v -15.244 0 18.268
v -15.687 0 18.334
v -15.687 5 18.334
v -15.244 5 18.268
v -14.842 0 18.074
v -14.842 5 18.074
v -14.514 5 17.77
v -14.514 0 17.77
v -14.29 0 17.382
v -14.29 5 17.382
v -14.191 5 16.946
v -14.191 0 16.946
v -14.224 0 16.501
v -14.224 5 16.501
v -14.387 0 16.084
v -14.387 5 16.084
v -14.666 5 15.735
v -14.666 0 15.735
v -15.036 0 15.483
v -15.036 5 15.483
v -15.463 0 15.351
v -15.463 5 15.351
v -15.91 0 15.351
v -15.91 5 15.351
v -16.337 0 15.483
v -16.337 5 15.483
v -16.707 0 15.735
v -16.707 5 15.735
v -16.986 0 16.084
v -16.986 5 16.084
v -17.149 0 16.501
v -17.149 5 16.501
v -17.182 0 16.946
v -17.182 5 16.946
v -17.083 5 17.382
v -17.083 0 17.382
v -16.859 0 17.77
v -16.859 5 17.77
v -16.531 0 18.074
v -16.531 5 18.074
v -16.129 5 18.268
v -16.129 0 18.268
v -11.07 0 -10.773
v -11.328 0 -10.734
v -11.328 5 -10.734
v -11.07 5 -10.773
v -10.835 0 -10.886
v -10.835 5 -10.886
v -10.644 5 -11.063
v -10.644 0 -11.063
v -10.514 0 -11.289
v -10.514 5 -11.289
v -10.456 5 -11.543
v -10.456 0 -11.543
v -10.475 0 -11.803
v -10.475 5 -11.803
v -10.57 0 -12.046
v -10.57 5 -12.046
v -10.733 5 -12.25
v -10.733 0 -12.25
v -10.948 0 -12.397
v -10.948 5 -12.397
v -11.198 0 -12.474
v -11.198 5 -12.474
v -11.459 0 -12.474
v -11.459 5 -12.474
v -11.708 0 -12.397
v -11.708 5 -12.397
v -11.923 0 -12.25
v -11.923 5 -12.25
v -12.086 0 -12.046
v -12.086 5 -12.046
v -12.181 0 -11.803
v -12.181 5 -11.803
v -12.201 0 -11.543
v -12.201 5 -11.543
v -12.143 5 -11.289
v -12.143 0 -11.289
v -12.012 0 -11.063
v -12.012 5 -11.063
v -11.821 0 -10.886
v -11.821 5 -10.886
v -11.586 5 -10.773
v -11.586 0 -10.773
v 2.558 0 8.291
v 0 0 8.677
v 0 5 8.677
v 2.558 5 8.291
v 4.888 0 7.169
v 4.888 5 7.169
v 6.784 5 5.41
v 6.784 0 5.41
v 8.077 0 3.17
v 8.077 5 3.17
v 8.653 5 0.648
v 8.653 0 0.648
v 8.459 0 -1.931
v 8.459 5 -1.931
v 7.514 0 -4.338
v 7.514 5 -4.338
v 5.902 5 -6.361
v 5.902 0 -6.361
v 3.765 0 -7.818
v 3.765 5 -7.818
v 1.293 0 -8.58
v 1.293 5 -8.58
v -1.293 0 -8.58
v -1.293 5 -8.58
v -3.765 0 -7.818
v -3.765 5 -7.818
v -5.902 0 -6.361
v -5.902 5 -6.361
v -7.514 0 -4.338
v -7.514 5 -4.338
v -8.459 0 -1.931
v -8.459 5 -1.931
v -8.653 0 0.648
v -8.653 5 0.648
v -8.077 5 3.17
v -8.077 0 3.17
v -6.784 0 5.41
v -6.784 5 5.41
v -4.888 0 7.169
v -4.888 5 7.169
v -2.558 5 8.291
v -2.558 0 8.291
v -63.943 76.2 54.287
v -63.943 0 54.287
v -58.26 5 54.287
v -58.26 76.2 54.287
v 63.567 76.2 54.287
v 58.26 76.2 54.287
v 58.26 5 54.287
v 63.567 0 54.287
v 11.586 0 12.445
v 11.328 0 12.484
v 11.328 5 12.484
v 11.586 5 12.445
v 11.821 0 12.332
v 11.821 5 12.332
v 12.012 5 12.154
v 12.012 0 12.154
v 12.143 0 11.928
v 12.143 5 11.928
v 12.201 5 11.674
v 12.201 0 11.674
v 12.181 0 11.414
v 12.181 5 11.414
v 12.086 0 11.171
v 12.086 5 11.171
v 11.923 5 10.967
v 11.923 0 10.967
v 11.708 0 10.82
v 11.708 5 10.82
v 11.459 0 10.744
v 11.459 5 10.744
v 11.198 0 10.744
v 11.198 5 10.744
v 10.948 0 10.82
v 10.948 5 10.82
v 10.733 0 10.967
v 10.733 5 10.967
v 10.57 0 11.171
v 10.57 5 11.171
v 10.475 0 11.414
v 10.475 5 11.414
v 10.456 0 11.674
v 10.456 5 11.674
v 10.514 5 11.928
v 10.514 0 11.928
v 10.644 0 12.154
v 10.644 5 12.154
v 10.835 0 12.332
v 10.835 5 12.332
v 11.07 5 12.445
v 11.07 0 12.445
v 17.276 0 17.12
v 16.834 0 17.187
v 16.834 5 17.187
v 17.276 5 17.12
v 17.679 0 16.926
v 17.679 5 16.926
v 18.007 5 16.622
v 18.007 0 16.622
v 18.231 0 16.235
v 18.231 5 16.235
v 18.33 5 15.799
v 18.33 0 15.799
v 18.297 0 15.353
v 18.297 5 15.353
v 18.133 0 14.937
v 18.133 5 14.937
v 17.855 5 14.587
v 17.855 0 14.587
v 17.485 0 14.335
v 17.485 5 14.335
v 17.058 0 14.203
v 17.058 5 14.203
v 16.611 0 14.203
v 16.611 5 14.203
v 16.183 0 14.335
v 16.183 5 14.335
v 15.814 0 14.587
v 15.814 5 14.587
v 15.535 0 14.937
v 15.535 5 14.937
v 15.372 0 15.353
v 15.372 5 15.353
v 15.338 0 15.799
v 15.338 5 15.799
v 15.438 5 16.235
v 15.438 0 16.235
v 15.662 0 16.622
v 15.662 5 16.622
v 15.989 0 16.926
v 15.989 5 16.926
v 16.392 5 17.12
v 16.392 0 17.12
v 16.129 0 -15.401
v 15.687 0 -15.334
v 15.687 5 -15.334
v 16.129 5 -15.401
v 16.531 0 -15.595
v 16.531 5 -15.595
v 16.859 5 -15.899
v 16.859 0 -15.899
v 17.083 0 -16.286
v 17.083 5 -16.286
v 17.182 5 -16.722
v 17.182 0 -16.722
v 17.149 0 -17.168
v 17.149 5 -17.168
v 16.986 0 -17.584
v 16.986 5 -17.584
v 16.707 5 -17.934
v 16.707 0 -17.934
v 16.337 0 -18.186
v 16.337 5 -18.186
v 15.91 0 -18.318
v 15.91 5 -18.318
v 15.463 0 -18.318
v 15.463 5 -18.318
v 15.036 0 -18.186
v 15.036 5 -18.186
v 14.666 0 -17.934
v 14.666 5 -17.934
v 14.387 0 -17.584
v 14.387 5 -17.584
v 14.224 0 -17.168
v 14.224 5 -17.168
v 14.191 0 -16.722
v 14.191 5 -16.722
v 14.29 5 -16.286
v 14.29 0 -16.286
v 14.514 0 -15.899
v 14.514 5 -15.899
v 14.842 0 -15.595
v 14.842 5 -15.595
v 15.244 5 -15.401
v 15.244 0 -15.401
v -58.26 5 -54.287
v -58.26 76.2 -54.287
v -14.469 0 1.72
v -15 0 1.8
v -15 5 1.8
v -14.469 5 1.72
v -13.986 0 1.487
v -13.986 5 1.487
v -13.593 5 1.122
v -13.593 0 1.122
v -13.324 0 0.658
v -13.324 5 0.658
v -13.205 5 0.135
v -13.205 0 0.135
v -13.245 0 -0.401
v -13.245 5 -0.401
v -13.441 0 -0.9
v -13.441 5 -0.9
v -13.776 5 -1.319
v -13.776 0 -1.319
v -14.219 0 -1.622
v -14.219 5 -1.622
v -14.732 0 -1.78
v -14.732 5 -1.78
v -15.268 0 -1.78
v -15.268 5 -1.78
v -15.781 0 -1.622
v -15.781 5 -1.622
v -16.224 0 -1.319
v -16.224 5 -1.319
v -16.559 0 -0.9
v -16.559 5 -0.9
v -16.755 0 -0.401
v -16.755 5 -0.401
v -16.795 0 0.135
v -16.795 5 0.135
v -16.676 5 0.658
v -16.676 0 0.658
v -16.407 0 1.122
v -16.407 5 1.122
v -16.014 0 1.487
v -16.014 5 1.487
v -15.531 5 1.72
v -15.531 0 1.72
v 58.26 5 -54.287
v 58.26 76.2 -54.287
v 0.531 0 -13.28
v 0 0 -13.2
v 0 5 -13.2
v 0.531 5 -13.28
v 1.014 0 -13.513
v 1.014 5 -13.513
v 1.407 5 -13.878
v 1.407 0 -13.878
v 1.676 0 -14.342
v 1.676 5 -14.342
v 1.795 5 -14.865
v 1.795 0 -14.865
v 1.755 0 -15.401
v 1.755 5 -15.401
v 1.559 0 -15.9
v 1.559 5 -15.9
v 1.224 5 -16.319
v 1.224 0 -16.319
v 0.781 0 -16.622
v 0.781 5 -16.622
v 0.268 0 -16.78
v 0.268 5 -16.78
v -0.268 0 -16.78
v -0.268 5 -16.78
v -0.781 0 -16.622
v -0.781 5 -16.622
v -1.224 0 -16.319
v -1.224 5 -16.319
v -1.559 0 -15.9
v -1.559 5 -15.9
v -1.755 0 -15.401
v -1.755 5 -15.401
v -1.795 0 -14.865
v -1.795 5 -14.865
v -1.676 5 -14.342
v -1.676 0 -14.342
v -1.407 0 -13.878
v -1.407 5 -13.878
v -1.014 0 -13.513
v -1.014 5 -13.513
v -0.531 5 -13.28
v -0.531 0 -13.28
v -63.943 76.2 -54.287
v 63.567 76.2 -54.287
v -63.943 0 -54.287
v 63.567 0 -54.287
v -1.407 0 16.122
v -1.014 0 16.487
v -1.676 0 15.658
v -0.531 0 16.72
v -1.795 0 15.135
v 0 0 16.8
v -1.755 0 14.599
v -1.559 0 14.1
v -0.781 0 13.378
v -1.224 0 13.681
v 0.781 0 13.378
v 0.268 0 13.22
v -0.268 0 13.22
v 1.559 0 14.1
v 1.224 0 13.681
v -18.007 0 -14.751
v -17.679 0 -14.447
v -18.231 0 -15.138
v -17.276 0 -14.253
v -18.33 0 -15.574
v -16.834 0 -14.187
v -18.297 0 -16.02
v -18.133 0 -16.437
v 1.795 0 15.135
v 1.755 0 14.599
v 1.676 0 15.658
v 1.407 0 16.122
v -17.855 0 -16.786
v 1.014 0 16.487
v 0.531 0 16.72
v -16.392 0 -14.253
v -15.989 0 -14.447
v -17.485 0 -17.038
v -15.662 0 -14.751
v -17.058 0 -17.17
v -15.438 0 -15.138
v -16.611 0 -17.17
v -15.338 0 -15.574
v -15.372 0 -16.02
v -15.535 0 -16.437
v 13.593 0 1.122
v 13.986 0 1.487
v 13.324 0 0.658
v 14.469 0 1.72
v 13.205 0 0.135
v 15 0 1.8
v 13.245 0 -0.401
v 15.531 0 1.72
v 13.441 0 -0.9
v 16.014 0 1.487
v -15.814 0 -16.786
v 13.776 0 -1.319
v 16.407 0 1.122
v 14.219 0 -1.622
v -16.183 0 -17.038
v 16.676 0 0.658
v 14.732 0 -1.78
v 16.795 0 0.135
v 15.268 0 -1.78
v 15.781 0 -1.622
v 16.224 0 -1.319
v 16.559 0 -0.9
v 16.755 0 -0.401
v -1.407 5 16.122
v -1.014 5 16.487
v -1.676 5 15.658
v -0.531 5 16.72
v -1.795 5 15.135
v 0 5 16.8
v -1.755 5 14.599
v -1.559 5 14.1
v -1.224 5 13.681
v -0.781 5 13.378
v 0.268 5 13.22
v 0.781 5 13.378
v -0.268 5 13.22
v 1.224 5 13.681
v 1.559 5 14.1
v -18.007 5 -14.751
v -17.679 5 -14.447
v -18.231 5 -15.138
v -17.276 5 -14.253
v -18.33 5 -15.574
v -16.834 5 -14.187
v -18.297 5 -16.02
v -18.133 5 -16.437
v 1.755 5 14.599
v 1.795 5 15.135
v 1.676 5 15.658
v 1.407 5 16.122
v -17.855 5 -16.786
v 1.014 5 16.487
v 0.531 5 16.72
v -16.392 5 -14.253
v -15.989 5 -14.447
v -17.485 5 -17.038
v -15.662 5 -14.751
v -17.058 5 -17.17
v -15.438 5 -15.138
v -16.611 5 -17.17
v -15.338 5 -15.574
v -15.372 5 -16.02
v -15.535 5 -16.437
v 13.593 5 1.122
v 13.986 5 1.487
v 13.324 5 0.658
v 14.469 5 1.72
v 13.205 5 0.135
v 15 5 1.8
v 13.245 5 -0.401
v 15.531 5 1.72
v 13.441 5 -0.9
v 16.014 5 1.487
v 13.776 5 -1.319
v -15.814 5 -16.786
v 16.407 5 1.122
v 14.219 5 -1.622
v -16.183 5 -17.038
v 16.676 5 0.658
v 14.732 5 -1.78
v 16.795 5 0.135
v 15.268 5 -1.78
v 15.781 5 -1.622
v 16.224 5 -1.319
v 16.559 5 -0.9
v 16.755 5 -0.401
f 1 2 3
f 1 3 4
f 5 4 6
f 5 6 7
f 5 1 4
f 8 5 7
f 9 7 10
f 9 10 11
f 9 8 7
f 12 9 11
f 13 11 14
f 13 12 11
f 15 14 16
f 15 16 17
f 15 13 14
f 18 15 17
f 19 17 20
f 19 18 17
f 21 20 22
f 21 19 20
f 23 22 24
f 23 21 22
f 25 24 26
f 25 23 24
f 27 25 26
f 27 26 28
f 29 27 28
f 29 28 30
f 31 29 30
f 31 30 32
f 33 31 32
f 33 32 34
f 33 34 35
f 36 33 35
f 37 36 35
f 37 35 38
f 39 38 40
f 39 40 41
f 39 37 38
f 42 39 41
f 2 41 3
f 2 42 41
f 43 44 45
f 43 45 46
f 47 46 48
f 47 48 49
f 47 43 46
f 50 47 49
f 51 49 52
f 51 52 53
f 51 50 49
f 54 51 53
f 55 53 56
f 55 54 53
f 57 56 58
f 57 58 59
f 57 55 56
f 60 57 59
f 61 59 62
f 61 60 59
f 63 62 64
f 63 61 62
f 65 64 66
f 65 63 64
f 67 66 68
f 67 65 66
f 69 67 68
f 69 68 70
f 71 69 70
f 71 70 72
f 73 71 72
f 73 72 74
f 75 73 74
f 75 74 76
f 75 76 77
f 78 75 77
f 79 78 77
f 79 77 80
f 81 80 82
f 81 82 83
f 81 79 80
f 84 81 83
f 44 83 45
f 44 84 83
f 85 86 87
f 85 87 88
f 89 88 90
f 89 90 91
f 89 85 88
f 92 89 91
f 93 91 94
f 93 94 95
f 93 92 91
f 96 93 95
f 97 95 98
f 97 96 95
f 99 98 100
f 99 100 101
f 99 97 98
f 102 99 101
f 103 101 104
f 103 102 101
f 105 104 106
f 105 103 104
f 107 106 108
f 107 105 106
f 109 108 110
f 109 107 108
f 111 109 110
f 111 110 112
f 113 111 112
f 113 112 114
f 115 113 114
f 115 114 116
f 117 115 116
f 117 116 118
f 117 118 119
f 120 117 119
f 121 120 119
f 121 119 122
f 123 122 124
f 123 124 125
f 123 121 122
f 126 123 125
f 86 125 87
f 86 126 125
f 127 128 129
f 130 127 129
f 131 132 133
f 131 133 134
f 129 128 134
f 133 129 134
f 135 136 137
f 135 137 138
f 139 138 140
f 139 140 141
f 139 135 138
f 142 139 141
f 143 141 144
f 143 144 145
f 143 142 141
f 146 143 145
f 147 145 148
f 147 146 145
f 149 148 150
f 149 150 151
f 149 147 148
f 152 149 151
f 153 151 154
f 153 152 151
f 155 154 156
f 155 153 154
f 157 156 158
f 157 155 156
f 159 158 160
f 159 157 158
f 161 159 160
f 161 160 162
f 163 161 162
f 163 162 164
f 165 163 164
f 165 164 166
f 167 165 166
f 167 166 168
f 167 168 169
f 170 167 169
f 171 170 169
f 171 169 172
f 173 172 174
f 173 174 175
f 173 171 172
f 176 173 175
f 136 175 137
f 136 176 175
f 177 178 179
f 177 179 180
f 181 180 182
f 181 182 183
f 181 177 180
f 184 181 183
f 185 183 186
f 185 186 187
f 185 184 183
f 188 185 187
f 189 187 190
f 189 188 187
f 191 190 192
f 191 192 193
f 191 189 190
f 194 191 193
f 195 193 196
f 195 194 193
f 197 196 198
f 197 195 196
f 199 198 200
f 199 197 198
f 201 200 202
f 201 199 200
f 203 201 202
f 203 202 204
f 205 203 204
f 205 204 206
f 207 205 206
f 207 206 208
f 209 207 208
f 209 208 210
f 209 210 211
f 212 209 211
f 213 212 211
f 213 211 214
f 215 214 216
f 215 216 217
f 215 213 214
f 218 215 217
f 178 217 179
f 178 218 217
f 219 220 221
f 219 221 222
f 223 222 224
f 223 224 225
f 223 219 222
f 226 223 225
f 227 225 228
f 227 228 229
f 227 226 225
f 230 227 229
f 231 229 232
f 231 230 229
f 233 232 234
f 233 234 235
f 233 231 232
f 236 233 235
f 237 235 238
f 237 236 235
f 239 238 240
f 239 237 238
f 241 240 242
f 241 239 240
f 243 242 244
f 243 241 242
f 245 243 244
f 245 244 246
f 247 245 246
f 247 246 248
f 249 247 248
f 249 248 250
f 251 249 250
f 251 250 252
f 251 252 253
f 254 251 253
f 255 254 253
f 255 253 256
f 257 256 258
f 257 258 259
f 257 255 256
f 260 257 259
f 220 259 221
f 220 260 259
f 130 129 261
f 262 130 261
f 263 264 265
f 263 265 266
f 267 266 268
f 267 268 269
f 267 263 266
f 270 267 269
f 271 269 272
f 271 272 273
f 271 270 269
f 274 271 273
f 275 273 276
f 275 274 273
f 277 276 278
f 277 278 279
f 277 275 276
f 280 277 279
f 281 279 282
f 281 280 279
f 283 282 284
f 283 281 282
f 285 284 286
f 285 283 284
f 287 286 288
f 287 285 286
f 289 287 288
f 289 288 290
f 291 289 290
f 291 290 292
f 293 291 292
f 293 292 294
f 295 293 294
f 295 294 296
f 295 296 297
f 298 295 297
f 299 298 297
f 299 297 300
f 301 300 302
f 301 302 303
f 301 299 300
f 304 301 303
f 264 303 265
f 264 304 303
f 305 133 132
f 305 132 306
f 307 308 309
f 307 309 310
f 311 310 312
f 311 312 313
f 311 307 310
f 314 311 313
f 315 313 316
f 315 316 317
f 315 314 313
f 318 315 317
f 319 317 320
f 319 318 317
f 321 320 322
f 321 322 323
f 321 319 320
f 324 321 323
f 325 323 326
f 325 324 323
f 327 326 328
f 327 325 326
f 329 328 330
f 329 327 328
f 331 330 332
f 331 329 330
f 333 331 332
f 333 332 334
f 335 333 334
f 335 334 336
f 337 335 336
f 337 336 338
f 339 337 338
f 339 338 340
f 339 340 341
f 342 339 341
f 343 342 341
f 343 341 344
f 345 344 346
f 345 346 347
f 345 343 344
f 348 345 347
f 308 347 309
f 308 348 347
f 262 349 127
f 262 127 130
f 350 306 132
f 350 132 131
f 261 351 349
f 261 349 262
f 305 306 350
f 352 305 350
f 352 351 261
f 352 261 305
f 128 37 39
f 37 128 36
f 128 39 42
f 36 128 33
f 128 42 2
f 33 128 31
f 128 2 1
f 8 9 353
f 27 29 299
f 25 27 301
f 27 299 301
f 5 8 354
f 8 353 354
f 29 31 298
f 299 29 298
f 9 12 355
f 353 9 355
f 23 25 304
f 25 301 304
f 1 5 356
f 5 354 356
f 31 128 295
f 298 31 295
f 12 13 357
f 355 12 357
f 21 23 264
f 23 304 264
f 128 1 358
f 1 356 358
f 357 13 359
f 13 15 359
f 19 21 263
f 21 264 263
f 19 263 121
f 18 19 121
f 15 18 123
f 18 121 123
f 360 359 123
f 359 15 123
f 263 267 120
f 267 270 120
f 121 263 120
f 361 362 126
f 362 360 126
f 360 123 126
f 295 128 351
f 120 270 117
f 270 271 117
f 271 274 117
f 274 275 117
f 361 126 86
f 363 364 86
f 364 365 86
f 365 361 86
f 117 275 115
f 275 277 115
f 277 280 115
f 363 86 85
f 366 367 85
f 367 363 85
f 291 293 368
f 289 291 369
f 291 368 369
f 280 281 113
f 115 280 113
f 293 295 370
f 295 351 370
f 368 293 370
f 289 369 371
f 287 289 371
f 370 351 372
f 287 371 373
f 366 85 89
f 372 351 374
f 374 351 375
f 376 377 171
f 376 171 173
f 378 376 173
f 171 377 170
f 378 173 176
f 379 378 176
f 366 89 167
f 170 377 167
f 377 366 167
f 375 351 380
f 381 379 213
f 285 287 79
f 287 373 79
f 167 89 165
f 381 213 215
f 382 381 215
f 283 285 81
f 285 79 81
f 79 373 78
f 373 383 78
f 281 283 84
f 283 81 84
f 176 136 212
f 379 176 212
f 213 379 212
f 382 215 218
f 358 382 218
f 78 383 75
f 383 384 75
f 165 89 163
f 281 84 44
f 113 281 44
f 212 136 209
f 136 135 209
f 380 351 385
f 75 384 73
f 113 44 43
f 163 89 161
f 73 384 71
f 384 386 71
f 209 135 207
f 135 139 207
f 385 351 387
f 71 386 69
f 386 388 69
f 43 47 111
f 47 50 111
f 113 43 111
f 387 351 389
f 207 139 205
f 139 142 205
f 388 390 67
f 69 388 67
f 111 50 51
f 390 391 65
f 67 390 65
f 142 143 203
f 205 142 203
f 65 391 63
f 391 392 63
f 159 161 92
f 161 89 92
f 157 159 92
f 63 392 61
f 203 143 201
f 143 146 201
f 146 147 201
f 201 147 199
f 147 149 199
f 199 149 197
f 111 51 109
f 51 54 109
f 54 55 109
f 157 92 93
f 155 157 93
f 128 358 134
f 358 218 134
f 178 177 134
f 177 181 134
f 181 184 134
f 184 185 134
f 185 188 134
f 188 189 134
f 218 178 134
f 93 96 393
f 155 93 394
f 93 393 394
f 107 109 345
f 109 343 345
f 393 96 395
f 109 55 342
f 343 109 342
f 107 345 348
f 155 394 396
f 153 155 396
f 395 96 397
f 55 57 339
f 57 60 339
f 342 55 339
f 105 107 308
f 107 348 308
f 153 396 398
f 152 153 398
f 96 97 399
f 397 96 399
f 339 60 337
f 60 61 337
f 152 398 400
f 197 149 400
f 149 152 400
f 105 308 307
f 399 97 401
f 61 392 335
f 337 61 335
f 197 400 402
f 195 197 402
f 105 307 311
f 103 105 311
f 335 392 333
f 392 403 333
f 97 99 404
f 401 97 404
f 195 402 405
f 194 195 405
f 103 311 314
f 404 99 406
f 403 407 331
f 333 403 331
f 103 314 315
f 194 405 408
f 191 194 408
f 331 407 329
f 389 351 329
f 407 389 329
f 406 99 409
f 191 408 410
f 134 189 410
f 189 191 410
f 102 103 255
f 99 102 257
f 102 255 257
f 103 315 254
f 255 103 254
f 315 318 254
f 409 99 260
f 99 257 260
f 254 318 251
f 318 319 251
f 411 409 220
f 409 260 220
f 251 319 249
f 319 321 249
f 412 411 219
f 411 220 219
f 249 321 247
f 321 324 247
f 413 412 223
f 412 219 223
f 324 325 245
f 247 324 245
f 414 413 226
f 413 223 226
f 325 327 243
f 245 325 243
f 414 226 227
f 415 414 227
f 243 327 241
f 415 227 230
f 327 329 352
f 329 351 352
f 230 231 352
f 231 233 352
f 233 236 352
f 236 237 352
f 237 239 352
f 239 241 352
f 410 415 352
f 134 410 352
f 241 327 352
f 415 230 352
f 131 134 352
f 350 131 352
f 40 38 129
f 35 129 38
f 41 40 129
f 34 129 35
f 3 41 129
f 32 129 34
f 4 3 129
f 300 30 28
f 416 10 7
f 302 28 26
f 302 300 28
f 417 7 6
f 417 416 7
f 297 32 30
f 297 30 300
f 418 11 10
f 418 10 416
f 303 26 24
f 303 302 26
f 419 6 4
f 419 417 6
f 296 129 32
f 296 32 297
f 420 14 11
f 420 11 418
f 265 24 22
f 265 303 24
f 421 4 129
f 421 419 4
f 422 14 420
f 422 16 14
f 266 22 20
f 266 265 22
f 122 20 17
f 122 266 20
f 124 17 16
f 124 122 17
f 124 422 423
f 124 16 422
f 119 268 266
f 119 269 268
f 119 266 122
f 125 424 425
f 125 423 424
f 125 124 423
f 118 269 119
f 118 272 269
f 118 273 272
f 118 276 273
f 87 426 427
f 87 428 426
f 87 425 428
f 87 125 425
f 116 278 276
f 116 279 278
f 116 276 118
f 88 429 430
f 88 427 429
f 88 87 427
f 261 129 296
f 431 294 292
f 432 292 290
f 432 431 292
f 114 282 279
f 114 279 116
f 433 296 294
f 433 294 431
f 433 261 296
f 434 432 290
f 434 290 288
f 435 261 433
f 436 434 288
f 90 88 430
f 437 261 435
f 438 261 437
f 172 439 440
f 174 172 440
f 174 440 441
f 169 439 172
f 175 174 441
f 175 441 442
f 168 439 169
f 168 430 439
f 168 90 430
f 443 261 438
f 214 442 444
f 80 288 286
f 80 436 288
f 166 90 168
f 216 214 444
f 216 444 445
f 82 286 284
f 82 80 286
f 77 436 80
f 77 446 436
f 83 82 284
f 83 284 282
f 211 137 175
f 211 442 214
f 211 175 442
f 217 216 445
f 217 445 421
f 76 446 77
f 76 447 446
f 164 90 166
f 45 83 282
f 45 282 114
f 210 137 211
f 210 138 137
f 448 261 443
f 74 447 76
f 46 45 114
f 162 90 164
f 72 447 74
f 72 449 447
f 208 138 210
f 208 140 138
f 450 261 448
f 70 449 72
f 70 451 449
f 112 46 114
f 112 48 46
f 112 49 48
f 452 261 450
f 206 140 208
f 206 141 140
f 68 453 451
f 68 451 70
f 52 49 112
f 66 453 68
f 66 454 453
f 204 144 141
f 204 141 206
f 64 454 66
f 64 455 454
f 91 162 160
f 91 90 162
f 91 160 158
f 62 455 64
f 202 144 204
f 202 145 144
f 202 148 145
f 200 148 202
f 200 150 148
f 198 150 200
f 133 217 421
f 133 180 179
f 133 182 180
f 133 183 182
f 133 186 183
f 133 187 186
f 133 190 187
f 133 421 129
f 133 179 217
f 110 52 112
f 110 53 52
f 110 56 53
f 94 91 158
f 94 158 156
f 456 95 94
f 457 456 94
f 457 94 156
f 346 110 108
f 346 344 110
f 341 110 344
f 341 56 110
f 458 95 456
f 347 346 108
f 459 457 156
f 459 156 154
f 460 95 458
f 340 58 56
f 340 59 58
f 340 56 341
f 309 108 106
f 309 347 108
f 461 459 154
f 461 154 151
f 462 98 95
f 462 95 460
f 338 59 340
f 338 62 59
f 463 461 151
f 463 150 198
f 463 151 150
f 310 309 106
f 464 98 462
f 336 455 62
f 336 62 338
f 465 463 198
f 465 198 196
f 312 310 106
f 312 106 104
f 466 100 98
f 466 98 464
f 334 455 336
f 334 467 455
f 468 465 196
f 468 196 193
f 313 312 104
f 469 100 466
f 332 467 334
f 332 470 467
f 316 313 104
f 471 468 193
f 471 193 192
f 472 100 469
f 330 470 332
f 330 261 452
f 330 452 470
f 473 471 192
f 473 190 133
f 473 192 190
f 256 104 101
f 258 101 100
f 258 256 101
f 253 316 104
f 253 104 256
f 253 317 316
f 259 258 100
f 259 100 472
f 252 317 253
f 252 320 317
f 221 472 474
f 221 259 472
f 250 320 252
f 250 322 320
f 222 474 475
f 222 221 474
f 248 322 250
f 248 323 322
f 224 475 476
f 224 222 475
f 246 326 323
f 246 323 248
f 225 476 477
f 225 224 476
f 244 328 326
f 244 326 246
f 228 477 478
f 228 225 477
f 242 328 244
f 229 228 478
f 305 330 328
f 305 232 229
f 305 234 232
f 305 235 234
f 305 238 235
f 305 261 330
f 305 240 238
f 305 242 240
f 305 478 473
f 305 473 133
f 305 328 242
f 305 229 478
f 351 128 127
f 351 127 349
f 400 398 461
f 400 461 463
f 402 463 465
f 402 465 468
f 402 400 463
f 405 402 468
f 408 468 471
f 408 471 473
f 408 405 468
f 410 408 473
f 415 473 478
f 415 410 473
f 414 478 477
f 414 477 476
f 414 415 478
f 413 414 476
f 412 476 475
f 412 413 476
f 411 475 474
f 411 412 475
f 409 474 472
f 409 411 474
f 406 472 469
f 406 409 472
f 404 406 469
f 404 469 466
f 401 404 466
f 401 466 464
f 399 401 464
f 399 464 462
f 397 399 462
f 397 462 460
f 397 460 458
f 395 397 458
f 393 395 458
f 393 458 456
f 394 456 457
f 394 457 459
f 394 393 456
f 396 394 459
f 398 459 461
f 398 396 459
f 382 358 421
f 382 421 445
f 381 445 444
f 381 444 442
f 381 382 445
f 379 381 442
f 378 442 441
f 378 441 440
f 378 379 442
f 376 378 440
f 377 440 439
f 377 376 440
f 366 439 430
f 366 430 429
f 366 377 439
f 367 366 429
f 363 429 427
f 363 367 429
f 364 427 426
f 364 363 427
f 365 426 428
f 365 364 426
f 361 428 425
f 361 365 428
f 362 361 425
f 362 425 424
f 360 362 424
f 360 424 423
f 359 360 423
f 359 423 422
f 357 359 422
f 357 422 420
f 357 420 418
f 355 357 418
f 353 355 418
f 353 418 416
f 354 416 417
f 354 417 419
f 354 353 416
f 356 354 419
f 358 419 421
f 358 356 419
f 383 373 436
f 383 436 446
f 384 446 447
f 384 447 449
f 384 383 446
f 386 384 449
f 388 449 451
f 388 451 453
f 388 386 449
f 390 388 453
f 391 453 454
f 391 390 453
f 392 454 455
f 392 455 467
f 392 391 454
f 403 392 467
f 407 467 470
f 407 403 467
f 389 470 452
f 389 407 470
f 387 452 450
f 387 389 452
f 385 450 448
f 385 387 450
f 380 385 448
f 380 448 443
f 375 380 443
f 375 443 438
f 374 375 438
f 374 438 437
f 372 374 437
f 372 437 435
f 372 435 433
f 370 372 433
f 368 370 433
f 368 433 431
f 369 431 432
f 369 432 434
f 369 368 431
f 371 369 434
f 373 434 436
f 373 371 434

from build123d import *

# Parameters (mm, degrees)
SKETCH1_W             = 5.683554567
SKETCH1_H             = 108.574669318
BOSS_EXTRUDE2_DEPTH   = 76.2
SKETCH1_W_2           = 5.307190744
BOSS_EXTRUDE2_2_DEPTH = 76.2
SKETCH1_5_W           = 116.519157318
SKETCH1_5_H           = 108.574669318
SKETCH1_5_R           = 1.5
SKETCH1_5_R_2         = 1.8
SKETCH1_5_R_3         = 0.875
SKETCH1_5_R_4         = 8.6768437
BOSS_EXTRUDE3_DEPTH   = 5


with BuildPart() as part:
    # Sketch1 → Boss-Extrude2 (new body)
    with BuildSketch(Plane(origin=(0, 0, 0), x_dir=(1, 0, 0), z_dir=(0, 1, 0))):
        with Locations((-61.101355943, 0)):
            Rectangle(SKETCH1_W, SKETCH1_H)
    extrude(amount=BOSS_EXTRUDE2_DEPTH)



with BuildPart() as body_2:
    # Sketch1 → Boss-Extrude2 2 (new body)
    with BuildSketch(Plane(origin=(0, 0, 0), x_dir=(1, 0, 0), z_dir=(0, 1, 0))):
        with Locations((60.913174031, 0)):
            Rectangle(SKETCH1_W_2, SKETCH1_H)
    extrude(amount=BOSS_EXTRUDE2_2_DEPTH)


with BuildPart() as part_1:
    add(part.part)

    add(body_2.part)  # Boss-Extrude3 merges body 2
    # Sketch1<5> → Boss-Extrude3 (add)
    with BuildSketch(Plane(origin=(0, 0, 0), x_dir=(1, 0, 0), z_dir=(0, 1, 0))):
        Rectangle(SKETCH1_5_W, SKETCH1_5_H)
        with Locations((-15.686506038, -16.834299163)):
            Circle(SKETCH1_5_R, mode=Mode.SUBTRACT)
        with Locations((-15, 0)):
            Circle(SKETCH1_5_R_2, mode=Mode.SUBTRACT)
        with Locations((0, -15)):
            Circle(SKETCH1_5_R_2, mode=Mode.SUBTRACT)
        with Locations((16.834299163, -15.686506038)):
            Circle(SKETCH1_5_R, mode=Mode.SUBTRACT)
        with Locations((11.328100331, -11.608727014)):
            Circle(SKETCH1_5_R_3, mode=Mode.SUBTRACT)
        Circle(SKETCH1_5_R_4, mode=Mode.SUBTRACT)
        with Locations((-11.328100331, 11.608727014)):
            Circle(SKETCH1_5_R_3, mode=Mode.SUBTRACT)
        with Locations((-16.834299163, 15.686506038)):
            Circle(SKETCH1_5_R, mode=Mode.SUBTRACT)
        with Locations((15, 0)):
            Circle(SKETCH1_5_R_2, mode=Mode.SUBTRACT)
        with Locations((0, 15)):
            Circle(SKETCH1_5_R_2, mode=Mode.SUBTRACT)
        with Locations((15.686506038, 16.834299163)):
            Circle(SKETCH1_5_R, mode=Mode.SUBTRACT)
    extrude(amount=BOSS_EXTRUDE3_DEPTH)


solid = part_1.part
